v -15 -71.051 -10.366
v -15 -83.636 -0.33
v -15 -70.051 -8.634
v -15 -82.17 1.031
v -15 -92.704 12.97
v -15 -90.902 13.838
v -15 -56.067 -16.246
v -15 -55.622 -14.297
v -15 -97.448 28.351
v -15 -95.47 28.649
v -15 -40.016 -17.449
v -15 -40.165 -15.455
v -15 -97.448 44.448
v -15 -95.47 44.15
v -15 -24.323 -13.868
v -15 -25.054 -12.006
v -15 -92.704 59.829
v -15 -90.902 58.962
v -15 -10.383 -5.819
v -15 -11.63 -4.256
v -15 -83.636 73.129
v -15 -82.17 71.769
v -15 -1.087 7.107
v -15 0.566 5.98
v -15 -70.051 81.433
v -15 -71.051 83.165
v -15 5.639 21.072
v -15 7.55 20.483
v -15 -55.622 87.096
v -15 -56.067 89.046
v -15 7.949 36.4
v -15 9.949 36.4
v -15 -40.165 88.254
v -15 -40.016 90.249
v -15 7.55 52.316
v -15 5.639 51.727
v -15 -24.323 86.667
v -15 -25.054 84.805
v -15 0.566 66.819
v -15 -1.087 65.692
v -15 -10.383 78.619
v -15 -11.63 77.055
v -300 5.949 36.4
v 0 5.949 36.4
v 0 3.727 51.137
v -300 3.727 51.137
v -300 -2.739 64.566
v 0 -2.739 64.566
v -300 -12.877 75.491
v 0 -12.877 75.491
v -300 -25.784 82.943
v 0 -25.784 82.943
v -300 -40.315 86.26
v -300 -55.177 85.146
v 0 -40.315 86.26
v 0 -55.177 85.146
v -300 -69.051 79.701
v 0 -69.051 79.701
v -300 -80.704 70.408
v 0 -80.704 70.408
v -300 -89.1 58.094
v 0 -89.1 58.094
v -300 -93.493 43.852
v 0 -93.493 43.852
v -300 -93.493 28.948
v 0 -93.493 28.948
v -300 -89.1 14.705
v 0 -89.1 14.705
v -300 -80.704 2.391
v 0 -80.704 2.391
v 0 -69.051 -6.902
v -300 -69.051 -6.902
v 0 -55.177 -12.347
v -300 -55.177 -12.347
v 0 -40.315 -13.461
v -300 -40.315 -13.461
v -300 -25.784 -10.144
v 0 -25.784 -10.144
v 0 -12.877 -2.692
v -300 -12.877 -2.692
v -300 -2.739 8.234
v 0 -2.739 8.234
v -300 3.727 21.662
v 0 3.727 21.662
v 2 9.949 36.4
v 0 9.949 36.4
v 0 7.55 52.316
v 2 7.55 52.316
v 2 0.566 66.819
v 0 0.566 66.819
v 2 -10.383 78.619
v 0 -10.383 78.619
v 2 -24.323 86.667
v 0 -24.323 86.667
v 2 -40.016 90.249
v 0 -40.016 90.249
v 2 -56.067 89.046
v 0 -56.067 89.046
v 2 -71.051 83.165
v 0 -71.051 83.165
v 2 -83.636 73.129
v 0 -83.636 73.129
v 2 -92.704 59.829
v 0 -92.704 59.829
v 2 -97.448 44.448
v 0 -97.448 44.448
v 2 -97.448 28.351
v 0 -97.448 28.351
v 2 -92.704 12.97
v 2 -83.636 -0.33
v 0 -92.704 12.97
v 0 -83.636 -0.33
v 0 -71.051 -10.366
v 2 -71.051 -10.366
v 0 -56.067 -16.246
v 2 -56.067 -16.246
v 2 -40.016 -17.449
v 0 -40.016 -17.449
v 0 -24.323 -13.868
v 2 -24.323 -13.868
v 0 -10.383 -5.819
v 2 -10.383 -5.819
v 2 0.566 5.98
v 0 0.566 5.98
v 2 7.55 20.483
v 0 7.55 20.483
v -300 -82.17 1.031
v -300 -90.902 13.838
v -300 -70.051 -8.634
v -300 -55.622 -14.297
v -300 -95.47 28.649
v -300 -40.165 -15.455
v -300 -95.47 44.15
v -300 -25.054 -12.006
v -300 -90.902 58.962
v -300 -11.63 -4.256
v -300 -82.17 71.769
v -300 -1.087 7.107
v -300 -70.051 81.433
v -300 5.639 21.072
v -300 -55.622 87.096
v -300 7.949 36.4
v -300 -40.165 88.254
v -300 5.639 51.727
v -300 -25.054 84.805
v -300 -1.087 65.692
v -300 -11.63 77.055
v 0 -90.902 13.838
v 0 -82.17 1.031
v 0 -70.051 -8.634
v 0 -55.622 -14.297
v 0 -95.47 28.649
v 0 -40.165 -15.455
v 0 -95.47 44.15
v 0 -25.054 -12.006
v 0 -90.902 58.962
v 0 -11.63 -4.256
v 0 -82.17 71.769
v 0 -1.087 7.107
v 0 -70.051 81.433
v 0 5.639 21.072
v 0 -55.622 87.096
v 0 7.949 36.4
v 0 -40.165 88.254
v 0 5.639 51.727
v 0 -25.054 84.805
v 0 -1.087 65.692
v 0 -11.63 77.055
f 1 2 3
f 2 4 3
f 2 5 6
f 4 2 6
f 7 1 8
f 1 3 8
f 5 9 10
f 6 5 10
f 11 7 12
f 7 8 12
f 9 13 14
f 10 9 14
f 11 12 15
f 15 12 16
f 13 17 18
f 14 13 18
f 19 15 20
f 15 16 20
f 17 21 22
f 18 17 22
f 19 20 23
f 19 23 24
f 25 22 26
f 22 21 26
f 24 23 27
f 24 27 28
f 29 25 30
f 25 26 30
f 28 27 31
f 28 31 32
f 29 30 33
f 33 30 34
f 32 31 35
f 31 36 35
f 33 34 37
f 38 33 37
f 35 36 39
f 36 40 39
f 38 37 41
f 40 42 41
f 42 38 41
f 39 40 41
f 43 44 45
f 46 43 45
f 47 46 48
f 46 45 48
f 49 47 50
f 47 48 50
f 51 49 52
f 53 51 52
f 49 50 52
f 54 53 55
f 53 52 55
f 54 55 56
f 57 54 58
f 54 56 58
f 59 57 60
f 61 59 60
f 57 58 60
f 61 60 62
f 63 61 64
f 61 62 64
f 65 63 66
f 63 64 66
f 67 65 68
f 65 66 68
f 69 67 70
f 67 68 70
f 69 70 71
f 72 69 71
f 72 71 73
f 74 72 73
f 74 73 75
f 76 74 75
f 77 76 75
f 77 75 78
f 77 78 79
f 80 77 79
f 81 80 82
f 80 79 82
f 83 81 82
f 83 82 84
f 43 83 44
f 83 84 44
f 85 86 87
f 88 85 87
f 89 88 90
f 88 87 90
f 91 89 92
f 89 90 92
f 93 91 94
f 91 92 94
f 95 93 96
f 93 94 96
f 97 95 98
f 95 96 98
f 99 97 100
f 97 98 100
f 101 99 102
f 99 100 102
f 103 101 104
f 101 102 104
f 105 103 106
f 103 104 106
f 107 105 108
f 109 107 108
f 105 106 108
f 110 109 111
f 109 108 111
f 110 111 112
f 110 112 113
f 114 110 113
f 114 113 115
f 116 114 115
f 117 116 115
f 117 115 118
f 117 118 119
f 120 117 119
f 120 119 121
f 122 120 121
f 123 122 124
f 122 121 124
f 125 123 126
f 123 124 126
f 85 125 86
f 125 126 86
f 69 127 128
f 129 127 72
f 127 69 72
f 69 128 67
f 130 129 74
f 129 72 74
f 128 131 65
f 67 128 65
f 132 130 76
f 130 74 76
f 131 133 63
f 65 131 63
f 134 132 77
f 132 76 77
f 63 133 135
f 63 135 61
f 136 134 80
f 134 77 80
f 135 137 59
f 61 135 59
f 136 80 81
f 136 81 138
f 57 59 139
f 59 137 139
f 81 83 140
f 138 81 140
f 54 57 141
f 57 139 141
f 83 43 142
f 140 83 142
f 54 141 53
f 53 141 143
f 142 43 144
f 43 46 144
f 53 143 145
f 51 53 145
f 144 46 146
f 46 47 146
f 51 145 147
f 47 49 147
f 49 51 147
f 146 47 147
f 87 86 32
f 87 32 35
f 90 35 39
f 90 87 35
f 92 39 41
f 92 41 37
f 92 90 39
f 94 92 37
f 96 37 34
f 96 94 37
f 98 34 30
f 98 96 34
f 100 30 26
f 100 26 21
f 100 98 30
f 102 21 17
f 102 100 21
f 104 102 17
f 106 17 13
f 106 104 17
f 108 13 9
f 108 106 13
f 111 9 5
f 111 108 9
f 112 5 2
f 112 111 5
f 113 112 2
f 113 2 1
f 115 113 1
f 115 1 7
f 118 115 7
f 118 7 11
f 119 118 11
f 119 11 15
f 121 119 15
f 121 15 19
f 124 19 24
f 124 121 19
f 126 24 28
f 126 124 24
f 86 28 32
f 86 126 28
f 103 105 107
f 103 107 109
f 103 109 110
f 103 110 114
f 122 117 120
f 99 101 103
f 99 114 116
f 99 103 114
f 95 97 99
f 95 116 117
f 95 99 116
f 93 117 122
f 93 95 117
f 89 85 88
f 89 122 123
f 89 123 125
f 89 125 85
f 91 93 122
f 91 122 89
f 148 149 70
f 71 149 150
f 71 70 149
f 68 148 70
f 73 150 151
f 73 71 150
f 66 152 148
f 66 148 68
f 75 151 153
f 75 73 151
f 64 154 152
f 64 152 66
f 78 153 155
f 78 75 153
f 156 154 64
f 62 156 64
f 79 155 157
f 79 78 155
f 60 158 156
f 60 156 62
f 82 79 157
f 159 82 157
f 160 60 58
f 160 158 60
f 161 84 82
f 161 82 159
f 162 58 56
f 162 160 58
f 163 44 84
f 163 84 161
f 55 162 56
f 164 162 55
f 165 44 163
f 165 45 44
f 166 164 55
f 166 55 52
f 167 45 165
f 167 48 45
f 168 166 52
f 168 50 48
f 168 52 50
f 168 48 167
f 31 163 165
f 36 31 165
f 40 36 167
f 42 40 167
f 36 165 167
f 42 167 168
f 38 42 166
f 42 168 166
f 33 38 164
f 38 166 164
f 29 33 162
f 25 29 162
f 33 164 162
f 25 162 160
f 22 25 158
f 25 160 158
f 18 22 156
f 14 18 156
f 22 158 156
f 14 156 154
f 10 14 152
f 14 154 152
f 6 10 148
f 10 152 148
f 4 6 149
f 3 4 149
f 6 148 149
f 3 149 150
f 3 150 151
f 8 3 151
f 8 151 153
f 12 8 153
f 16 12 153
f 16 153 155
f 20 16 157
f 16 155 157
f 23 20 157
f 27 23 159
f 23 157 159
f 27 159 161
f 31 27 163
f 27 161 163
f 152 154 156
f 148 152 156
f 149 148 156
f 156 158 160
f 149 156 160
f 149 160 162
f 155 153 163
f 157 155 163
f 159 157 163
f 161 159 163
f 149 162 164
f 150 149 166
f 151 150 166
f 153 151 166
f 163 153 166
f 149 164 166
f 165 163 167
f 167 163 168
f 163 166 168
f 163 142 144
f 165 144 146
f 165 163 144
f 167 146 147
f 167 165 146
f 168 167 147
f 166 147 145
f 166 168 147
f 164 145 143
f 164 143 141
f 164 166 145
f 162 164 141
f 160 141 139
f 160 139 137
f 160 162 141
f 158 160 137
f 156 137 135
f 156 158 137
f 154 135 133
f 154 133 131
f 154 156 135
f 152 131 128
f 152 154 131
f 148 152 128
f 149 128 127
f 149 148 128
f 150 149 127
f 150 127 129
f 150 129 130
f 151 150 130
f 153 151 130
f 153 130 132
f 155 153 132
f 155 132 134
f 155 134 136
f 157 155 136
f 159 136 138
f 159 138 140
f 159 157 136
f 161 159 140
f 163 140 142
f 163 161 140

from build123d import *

# Parameters (mm, degrees)
F2_R     = 52
F2_R_2   = 50
F3_DEPTH = 300
F5_R     = 54
F5_R_2   = 52
F6_DEPTH = 15
F5_R_3   = 50
F7_DEPTH = 2


with BuildPart() as f3:
    # F2 (on Right) → F3 (new body)
    with BuildSketch(Plane.YZ):
        with Locations((-44.0512485802, 36.3996587694)):
            Circle(F2_R)
        with Locations((-44.0512485802, 36.3996587694)):
            Circle(F2_R_2, mode=Mode.SUBTRACT)
    extrude(amount=-F3_DEPTH)


with BuildPart() as f6:
    # F5 (on face) → F6 (new body)
    with BuildSketch(Plane.YZ):
        with Locations((-44.0512485802, 36.3996587694)):
            Circle(F5_R)
        with Locations((-44.0512485802, 36.3996587694)):
            Circle(F5_R_2, mode=Mode.SUBTRACT)
    extrude(amount=-F6_DEPTH)

    # F5 (on face) → F7 (join)
    with BuildSketch(Plane.YZ):
        with Locations((-44.0512485802, 36.3996587694)):
            Circle(F5_R)
        with Locations((-44.0512485802, 36.3996587694)):
            Circle(F5_R_2, mode=Mode.SUBTRACT)
        with Locations((-44.0512485802, 36.3996587694)):
            Circle(F5_R_2)
        with Locations((-44.0512485802, 36.3996587694)):
            Circle(F5_R_3, mode=Mode.SUBTRACT)
        with Locations((-44.0512485802, 36.3996587694)):
            Circle(F5_R_3)
    extrude(amount=F7_DEPTH)


solid = Compound([f3.part, f6.part])
